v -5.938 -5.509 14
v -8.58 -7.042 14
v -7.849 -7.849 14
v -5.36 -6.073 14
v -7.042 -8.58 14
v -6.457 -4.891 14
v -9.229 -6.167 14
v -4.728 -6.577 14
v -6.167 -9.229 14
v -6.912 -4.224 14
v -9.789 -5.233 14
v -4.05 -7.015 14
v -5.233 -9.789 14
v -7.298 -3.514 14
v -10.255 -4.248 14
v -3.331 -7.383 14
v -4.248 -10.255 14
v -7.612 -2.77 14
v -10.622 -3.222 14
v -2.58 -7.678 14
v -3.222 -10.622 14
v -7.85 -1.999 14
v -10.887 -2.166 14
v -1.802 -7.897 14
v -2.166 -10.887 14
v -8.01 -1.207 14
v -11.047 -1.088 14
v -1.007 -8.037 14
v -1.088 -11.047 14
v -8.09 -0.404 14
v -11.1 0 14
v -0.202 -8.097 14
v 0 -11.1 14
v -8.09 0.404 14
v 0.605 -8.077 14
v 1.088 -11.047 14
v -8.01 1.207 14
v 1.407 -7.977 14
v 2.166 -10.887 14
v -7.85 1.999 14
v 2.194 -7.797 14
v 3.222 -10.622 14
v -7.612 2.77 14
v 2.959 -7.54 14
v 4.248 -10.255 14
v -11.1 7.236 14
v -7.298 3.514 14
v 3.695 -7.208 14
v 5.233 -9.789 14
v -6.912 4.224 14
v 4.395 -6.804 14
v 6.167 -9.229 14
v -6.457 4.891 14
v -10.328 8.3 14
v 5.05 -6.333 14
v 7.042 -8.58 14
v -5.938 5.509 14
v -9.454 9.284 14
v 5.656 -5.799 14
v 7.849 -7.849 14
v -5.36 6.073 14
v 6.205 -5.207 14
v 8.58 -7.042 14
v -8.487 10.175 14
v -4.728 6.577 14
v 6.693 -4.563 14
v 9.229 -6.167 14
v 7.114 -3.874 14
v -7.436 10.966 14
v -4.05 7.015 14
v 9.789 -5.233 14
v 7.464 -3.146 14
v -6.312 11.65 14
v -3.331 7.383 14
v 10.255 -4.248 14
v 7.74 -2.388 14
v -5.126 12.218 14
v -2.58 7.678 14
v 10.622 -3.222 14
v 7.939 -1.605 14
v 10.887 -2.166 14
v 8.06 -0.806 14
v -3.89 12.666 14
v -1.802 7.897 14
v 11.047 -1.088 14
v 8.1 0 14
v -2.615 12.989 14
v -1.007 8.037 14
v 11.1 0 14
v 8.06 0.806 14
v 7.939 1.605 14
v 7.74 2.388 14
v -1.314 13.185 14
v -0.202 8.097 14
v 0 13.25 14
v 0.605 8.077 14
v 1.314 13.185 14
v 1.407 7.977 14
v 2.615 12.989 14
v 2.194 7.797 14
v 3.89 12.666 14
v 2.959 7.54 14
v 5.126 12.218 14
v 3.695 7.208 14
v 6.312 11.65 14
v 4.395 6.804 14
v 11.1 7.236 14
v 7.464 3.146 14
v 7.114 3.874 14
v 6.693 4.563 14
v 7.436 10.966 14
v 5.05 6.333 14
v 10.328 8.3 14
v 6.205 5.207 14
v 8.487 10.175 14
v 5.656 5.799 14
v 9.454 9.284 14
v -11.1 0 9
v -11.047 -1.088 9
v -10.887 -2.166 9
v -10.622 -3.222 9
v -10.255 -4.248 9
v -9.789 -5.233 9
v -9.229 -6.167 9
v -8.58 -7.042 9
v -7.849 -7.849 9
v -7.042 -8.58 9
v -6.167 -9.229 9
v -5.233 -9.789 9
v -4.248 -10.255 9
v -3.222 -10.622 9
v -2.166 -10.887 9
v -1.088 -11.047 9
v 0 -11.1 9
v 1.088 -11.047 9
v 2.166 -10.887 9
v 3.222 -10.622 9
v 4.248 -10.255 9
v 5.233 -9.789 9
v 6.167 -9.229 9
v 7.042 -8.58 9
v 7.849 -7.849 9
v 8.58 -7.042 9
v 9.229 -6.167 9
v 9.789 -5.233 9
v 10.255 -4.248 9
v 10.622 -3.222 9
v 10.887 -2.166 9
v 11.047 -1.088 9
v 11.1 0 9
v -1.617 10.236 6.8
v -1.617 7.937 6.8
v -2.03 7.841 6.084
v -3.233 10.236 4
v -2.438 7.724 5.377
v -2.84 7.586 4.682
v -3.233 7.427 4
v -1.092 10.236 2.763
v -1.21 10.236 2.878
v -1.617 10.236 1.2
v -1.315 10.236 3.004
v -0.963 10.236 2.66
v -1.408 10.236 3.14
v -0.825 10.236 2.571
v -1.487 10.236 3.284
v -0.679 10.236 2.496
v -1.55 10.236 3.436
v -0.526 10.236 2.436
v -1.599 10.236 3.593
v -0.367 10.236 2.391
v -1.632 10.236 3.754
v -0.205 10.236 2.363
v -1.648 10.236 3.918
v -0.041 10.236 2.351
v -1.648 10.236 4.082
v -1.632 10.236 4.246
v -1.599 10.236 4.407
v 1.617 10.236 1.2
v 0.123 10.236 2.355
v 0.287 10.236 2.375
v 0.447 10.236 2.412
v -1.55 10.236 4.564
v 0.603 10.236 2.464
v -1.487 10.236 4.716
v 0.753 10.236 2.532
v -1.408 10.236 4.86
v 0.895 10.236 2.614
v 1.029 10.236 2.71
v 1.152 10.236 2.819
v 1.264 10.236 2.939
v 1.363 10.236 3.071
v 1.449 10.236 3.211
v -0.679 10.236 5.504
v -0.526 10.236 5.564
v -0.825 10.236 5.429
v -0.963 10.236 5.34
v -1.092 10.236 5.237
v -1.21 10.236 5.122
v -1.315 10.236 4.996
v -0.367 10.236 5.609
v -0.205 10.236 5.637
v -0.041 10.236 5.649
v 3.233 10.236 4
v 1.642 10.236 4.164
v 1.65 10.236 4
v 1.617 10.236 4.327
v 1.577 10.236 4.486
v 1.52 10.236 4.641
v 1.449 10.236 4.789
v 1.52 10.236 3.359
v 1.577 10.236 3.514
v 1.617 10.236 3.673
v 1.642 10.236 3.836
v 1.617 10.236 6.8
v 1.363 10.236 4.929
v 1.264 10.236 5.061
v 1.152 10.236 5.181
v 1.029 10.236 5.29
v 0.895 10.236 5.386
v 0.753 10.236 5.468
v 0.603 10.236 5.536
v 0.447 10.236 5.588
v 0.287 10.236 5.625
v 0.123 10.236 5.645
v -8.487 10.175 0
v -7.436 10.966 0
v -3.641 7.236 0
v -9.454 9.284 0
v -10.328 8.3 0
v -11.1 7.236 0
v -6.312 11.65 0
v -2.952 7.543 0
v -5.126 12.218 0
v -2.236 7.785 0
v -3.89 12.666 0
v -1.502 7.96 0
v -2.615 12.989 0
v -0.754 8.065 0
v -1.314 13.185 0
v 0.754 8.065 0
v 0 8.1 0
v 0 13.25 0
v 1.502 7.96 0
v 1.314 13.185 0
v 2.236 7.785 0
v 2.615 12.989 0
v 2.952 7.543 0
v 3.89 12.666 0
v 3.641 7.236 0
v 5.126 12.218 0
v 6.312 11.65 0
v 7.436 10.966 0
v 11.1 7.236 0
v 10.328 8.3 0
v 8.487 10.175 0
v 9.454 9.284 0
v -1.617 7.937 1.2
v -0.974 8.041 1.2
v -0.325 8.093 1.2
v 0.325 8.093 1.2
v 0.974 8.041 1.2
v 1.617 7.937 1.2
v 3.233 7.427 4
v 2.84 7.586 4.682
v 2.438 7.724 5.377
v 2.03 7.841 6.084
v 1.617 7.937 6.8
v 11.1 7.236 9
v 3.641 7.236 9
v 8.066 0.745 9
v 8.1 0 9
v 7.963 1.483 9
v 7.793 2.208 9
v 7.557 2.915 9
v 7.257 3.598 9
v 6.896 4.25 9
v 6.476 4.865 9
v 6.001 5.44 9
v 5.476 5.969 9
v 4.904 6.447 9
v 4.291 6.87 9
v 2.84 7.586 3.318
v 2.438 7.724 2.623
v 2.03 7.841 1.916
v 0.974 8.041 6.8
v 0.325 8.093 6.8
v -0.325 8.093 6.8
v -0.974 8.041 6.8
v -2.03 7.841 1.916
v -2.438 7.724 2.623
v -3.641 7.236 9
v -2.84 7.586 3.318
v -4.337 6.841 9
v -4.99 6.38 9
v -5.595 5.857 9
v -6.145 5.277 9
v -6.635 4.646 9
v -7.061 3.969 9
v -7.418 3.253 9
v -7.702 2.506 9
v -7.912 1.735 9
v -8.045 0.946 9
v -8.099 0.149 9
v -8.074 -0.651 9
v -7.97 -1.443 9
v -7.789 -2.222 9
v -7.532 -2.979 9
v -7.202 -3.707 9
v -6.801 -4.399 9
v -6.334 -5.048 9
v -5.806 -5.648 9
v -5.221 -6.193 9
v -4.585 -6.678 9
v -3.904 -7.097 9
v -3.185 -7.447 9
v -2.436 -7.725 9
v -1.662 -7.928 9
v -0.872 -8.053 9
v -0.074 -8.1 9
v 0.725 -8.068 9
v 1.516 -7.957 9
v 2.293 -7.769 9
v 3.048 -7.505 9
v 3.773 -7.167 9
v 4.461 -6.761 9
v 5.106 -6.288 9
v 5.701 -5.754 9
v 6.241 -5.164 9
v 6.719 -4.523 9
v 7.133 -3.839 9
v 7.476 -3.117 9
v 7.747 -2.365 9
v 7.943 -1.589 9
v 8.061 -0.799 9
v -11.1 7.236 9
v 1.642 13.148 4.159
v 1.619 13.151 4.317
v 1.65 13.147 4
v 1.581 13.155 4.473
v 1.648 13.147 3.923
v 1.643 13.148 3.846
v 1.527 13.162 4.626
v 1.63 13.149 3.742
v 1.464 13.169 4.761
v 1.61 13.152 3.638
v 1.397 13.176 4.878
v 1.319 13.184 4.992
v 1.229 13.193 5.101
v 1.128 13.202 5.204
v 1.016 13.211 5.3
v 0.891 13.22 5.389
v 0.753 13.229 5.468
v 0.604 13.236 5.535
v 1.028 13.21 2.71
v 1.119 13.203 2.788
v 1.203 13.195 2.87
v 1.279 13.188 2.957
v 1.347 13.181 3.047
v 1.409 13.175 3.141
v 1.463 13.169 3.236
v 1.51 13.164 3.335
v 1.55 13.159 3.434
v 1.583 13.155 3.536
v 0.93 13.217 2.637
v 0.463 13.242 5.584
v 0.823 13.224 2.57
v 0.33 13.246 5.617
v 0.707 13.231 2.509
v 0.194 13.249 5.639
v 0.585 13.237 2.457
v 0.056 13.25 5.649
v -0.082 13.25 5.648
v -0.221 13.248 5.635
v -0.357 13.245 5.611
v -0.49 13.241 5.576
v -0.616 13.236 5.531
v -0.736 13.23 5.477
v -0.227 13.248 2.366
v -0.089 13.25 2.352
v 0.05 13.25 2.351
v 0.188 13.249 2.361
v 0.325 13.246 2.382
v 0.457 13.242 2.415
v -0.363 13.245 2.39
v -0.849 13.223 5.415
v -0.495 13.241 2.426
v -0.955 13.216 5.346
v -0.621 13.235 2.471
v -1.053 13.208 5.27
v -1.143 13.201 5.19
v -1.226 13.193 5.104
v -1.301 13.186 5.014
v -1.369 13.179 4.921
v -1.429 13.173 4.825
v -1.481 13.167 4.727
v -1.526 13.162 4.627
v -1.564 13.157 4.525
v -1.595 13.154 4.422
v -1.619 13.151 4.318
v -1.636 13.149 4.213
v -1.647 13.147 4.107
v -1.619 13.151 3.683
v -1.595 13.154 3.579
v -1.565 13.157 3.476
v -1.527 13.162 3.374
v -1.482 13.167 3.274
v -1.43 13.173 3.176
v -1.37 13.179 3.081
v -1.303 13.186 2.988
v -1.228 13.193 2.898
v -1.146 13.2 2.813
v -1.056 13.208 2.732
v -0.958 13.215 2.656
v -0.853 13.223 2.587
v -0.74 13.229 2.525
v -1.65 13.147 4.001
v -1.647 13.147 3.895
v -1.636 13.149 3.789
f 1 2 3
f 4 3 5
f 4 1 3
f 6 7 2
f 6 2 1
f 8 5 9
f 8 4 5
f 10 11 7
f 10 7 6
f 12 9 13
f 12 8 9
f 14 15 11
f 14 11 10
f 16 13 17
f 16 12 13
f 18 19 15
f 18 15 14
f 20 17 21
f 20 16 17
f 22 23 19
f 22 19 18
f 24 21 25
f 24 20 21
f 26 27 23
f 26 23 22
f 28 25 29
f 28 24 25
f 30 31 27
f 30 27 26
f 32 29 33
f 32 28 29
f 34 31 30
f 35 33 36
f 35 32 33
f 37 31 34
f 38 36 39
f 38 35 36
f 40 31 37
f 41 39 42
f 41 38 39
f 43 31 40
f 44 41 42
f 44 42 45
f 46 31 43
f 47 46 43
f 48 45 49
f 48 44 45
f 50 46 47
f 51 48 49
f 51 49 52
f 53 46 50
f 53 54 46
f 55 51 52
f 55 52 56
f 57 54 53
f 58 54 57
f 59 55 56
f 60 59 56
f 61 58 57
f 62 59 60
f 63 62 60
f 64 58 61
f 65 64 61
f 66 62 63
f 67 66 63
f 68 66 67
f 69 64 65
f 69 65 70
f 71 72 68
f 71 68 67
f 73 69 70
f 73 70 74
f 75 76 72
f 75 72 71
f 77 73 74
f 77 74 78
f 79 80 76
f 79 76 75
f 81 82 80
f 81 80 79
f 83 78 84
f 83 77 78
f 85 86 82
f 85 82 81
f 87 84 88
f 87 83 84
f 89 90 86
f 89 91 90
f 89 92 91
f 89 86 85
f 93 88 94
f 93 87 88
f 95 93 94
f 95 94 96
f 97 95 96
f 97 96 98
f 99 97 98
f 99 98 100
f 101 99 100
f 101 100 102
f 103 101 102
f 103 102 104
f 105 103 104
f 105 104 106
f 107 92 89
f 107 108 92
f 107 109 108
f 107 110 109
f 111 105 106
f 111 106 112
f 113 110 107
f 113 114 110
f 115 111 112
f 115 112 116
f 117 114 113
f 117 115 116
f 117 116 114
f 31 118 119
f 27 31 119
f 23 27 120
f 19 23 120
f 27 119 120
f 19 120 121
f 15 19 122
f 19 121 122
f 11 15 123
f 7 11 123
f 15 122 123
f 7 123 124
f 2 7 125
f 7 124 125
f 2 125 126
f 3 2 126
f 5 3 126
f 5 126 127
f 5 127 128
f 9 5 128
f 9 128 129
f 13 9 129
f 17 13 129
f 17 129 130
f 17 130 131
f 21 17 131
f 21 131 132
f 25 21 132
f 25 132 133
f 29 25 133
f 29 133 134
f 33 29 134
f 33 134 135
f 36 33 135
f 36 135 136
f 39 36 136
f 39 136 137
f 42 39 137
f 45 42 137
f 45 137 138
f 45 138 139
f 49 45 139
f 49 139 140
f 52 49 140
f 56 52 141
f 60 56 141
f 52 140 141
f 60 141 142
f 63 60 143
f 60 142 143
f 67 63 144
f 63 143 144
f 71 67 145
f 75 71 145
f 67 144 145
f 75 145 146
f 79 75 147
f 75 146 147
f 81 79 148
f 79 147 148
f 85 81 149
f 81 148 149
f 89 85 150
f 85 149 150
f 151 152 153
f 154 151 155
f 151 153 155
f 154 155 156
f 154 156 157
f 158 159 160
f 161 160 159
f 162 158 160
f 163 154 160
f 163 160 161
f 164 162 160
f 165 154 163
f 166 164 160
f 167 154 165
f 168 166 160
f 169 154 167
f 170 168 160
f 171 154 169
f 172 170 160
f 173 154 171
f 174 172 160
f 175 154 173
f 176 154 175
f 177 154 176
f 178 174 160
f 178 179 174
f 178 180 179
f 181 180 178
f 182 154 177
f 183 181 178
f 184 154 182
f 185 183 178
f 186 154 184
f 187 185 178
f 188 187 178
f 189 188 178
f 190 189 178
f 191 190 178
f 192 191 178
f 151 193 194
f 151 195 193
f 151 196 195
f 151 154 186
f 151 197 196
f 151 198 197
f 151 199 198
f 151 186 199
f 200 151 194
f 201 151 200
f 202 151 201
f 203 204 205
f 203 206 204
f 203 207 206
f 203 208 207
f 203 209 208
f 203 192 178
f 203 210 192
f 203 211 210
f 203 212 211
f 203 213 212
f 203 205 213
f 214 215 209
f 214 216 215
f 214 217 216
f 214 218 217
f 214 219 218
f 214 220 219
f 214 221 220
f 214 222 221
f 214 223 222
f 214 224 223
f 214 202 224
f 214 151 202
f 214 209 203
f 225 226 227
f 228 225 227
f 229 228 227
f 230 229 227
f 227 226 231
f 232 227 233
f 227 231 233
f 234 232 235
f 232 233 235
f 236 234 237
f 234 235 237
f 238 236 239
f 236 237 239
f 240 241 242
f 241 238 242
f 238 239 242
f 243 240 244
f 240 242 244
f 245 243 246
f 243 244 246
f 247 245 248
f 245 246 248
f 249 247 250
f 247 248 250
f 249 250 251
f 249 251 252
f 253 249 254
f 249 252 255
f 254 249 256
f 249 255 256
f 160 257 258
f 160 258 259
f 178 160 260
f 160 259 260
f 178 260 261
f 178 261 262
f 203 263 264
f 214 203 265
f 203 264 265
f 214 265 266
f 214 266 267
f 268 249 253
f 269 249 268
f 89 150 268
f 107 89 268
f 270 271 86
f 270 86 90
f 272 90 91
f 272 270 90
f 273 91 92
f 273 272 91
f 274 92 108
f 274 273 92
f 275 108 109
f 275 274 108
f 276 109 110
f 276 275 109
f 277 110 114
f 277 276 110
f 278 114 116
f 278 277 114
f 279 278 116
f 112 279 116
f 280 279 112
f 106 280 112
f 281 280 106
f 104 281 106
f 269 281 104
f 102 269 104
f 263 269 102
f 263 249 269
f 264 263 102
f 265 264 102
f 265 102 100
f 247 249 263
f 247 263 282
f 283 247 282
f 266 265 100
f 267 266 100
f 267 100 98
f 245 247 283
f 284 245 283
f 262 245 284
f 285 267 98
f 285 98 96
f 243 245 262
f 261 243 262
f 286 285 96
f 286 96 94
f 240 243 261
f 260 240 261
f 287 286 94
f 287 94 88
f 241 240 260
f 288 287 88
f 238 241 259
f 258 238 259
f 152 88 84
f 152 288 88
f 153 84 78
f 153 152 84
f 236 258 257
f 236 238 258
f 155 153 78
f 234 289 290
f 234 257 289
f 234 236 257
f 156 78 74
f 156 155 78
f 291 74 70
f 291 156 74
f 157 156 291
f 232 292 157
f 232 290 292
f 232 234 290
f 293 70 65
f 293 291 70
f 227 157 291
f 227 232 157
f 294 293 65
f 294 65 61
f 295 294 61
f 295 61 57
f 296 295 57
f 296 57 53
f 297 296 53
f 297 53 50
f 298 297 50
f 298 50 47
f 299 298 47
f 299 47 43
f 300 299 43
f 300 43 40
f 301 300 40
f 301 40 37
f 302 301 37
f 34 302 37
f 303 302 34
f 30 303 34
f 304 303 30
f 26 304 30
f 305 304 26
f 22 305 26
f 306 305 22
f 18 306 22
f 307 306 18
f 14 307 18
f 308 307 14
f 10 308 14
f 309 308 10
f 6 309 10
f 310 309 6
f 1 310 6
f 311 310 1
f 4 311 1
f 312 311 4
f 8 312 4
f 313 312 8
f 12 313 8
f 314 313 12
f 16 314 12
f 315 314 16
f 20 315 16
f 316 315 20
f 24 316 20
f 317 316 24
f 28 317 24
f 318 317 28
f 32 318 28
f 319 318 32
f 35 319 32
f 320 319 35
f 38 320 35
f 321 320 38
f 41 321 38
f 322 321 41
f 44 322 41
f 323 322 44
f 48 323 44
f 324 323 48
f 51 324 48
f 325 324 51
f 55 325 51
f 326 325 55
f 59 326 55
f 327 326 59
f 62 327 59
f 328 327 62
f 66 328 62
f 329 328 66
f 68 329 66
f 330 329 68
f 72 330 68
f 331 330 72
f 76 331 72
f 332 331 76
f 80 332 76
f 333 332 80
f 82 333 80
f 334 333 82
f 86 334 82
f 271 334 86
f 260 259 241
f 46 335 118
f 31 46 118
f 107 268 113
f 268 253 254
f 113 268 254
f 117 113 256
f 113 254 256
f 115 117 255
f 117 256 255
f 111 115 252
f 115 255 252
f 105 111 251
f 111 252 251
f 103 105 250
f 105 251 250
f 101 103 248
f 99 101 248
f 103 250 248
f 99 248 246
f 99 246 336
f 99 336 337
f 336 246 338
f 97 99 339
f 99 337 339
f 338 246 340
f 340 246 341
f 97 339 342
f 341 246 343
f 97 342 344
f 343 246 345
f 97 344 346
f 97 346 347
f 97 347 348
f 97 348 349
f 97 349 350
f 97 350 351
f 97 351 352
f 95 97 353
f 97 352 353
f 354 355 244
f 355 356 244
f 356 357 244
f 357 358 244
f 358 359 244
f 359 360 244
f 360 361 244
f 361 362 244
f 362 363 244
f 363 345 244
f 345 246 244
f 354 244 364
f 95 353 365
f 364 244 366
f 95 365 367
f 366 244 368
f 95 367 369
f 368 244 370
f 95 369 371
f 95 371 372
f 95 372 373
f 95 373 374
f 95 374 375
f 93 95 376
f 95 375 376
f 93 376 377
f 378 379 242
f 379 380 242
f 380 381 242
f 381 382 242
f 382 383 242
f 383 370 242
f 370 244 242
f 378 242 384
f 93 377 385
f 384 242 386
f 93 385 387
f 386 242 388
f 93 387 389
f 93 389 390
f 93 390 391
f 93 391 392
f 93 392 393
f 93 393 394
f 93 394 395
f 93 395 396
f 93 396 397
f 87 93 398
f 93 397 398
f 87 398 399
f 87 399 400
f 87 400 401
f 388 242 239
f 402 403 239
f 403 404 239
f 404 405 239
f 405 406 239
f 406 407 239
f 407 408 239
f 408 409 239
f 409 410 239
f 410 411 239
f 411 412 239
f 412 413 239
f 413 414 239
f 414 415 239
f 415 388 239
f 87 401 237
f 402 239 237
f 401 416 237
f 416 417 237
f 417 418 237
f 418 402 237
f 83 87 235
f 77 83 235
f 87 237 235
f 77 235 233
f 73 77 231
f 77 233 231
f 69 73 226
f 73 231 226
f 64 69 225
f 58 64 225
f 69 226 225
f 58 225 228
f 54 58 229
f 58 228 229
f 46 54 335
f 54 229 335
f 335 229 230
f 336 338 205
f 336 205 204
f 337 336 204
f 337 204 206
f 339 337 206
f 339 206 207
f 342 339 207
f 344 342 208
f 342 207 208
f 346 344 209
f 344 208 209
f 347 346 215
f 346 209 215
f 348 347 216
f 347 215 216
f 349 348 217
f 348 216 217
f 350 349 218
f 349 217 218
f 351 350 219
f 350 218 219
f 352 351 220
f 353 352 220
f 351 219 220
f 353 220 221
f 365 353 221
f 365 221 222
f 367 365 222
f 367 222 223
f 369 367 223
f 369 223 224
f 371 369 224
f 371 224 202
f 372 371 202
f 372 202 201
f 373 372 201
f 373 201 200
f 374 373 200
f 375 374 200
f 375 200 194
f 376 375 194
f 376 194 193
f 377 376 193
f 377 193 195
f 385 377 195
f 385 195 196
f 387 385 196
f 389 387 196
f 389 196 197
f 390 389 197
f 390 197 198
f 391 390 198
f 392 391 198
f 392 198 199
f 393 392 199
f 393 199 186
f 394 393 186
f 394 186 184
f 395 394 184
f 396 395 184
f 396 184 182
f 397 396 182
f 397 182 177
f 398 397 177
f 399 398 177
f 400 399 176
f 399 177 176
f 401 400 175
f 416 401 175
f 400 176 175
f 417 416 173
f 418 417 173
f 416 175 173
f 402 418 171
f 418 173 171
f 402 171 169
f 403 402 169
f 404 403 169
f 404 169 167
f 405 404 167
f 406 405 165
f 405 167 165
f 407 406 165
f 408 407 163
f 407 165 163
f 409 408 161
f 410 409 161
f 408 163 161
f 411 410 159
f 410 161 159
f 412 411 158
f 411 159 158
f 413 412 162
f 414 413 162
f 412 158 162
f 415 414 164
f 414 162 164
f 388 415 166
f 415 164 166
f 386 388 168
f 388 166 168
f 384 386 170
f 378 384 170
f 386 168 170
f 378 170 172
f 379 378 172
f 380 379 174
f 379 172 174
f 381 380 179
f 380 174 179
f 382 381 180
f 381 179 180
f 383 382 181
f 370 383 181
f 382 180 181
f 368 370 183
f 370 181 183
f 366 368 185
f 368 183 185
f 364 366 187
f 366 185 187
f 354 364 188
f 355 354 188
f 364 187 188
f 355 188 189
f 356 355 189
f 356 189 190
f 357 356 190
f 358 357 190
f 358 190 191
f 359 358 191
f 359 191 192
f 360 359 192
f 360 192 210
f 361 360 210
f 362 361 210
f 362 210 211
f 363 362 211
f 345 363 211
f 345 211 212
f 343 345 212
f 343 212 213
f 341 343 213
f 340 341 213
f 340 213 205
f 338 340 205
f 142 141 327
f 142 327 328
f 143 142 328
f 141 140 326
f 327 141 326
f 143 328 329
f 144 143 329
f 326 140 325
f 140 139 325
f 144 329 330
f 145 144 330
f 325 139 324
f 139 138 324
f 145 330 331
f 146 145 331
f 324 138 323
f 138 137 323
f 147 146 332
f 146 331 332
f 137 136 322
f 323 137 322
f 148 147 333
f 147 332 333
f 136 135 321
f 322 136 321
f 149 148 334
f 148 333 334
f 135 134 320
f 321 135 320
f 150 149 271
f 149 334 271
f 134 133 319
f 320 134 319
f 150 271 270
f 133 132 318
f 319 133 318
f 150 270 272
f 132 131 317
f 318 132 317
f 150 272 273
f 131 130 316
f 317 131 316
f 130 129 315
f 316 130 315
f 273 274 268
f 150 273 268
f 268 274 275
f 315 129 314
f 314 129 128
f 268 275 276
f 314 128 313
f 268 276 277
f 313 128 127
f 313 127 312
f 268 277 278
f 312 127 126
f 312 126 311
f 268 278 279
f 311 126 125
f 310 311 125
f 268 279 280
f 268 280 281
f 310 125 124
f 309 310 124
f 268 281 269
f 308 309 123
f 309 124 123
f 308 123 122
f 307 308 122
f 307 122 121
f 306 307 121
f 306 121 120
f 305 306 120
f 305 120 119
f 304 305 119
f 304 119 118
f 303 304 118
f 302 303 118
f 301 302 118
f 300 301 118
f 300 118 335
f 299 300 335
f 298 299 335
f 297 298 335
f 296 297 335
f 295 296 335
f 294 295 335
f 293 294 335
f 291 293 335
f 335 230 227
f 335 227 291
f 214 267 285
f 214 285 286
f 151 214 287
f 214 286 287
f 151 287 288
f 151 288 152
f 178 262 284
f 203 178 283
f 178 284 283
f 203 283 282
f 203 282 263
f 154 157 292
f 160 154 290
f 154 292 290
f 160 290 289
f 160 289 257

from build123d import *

# Parameters (mm, degrees)
SKETCH1_R               = 8.1
BOSS_EXTRUDE1_DEPTH     = 14
CUT_EXTRUDE1_REACH      = 31.401
SKETCH2_W               = 9
SKETCH2_H               = 18.335502747
CUT_EXTRUDE2_REACH      = 27.601
CUT_EXTRUDE2_END_RADIUS = 13.25
SKETCH3_R               = 1.65
CUT_EXTRUDE3_DEPTH      = 3


with BuildPart() as part:
    # Sketch1 → Boss-Extrude1 (new body)
    with BuildSketch(Plane.XY):
        with BuildLine():
            ThreePointArc((-11.1, 0), (0, -11.1), (11.1, 0))
            Line((11.1, 0), (11.1, 7.235502747))
            ThreePointArc((11.1, 7.235502747), (0, 13.25), (-11.1, 7.235502747))
            Line((-11.1, 7.235502747), (-11.1, 0))
        make_face()
        Circle(SKETCH1_R, mode=Mode.SUBTRACT)
    extrude(amount=BOSS_EXTRUDE1_DEPTH)

    # Cut-Extrude1: up to this face of the body (flat: up to its plane)
    cut_extrude1_end = Plane(part.part.faces().sort_by_distance((11.1, 3.617751373, 7))[0])
    # Sketch2 → Cut-Extrude1 (cut, up to the picked face)
    with BuildSketch(Plane.ZY.offset(11.1), mode=Mode.PRIVATE) as cut_extrude1_sk1:
        with Locations((4.5, -1.932248627)):
            Rectangle(SKETCH2_W, SKETCH2_H)
    cut_extrude1_tool1 = split(extrude(cut_extrude1_sk1.sketch, amount=-CUT_EXTRUDE1_REACH, mode=Mode.PRIVATE), bisect_by=cut_extrude1_end, keep=Keep.BOTH, mode=Mode.PRIVATE)
    add(cut_extrude1_tool1.solids().sort_by(Axis((-11.1, -1.932249, 4.5), (1, 0, 0)))[0], mode=Mode.SUBTRACT)

    # Cut-Extrude2: up to this cylinder (the profile starts inside it)
    cut_extrude2_end = Plane(origin=(0, 0, 4), z_dir=(0, 0, -1)) * Cylinder(CUT_EXTRUDE2_END_RADIUS, 82.702, mode=Mode.PRIVATE)
    # Sketch3 → Cut-Extrude2 (cut, up to the surface)
    with BuildSketch(Plane.XZ.offset(-7.235502747), mode=Mode.PRIVATE) as cut_extrude2_sk1:
        with Locations((0, 4)):
            Circle(SKETCH3_R)
    cut_extrude2_tool1 = extrude(cut_extrude2_sk1.sketch, amount=-CUT_EXTRUDE2_REACH, mode=Mode.PRIVATE) & cut_extrude2_end
    add(cut_extrude2_tool1.solids().sort_by_distance((0, 7.235503, 4))[0], mode=Mode.SUBTRACT)

    # Sketch4 → Cut-Extrude3 (cut)
    with BuildSketch(Plane.XZ.offset(-7.235502747)):
        Polygon((1.616580754, 6.8), (-1.616580754, 6.8), (-3.233161507, 4), (-1.616580754, 1.2), (1.616580754, 1.2), (3.233161507, 4), align=None)
    extrude(amount=-CUT_EXTRUDE3_DEPTH, mode=Mode.SUBTRACT)


solid = part.part
